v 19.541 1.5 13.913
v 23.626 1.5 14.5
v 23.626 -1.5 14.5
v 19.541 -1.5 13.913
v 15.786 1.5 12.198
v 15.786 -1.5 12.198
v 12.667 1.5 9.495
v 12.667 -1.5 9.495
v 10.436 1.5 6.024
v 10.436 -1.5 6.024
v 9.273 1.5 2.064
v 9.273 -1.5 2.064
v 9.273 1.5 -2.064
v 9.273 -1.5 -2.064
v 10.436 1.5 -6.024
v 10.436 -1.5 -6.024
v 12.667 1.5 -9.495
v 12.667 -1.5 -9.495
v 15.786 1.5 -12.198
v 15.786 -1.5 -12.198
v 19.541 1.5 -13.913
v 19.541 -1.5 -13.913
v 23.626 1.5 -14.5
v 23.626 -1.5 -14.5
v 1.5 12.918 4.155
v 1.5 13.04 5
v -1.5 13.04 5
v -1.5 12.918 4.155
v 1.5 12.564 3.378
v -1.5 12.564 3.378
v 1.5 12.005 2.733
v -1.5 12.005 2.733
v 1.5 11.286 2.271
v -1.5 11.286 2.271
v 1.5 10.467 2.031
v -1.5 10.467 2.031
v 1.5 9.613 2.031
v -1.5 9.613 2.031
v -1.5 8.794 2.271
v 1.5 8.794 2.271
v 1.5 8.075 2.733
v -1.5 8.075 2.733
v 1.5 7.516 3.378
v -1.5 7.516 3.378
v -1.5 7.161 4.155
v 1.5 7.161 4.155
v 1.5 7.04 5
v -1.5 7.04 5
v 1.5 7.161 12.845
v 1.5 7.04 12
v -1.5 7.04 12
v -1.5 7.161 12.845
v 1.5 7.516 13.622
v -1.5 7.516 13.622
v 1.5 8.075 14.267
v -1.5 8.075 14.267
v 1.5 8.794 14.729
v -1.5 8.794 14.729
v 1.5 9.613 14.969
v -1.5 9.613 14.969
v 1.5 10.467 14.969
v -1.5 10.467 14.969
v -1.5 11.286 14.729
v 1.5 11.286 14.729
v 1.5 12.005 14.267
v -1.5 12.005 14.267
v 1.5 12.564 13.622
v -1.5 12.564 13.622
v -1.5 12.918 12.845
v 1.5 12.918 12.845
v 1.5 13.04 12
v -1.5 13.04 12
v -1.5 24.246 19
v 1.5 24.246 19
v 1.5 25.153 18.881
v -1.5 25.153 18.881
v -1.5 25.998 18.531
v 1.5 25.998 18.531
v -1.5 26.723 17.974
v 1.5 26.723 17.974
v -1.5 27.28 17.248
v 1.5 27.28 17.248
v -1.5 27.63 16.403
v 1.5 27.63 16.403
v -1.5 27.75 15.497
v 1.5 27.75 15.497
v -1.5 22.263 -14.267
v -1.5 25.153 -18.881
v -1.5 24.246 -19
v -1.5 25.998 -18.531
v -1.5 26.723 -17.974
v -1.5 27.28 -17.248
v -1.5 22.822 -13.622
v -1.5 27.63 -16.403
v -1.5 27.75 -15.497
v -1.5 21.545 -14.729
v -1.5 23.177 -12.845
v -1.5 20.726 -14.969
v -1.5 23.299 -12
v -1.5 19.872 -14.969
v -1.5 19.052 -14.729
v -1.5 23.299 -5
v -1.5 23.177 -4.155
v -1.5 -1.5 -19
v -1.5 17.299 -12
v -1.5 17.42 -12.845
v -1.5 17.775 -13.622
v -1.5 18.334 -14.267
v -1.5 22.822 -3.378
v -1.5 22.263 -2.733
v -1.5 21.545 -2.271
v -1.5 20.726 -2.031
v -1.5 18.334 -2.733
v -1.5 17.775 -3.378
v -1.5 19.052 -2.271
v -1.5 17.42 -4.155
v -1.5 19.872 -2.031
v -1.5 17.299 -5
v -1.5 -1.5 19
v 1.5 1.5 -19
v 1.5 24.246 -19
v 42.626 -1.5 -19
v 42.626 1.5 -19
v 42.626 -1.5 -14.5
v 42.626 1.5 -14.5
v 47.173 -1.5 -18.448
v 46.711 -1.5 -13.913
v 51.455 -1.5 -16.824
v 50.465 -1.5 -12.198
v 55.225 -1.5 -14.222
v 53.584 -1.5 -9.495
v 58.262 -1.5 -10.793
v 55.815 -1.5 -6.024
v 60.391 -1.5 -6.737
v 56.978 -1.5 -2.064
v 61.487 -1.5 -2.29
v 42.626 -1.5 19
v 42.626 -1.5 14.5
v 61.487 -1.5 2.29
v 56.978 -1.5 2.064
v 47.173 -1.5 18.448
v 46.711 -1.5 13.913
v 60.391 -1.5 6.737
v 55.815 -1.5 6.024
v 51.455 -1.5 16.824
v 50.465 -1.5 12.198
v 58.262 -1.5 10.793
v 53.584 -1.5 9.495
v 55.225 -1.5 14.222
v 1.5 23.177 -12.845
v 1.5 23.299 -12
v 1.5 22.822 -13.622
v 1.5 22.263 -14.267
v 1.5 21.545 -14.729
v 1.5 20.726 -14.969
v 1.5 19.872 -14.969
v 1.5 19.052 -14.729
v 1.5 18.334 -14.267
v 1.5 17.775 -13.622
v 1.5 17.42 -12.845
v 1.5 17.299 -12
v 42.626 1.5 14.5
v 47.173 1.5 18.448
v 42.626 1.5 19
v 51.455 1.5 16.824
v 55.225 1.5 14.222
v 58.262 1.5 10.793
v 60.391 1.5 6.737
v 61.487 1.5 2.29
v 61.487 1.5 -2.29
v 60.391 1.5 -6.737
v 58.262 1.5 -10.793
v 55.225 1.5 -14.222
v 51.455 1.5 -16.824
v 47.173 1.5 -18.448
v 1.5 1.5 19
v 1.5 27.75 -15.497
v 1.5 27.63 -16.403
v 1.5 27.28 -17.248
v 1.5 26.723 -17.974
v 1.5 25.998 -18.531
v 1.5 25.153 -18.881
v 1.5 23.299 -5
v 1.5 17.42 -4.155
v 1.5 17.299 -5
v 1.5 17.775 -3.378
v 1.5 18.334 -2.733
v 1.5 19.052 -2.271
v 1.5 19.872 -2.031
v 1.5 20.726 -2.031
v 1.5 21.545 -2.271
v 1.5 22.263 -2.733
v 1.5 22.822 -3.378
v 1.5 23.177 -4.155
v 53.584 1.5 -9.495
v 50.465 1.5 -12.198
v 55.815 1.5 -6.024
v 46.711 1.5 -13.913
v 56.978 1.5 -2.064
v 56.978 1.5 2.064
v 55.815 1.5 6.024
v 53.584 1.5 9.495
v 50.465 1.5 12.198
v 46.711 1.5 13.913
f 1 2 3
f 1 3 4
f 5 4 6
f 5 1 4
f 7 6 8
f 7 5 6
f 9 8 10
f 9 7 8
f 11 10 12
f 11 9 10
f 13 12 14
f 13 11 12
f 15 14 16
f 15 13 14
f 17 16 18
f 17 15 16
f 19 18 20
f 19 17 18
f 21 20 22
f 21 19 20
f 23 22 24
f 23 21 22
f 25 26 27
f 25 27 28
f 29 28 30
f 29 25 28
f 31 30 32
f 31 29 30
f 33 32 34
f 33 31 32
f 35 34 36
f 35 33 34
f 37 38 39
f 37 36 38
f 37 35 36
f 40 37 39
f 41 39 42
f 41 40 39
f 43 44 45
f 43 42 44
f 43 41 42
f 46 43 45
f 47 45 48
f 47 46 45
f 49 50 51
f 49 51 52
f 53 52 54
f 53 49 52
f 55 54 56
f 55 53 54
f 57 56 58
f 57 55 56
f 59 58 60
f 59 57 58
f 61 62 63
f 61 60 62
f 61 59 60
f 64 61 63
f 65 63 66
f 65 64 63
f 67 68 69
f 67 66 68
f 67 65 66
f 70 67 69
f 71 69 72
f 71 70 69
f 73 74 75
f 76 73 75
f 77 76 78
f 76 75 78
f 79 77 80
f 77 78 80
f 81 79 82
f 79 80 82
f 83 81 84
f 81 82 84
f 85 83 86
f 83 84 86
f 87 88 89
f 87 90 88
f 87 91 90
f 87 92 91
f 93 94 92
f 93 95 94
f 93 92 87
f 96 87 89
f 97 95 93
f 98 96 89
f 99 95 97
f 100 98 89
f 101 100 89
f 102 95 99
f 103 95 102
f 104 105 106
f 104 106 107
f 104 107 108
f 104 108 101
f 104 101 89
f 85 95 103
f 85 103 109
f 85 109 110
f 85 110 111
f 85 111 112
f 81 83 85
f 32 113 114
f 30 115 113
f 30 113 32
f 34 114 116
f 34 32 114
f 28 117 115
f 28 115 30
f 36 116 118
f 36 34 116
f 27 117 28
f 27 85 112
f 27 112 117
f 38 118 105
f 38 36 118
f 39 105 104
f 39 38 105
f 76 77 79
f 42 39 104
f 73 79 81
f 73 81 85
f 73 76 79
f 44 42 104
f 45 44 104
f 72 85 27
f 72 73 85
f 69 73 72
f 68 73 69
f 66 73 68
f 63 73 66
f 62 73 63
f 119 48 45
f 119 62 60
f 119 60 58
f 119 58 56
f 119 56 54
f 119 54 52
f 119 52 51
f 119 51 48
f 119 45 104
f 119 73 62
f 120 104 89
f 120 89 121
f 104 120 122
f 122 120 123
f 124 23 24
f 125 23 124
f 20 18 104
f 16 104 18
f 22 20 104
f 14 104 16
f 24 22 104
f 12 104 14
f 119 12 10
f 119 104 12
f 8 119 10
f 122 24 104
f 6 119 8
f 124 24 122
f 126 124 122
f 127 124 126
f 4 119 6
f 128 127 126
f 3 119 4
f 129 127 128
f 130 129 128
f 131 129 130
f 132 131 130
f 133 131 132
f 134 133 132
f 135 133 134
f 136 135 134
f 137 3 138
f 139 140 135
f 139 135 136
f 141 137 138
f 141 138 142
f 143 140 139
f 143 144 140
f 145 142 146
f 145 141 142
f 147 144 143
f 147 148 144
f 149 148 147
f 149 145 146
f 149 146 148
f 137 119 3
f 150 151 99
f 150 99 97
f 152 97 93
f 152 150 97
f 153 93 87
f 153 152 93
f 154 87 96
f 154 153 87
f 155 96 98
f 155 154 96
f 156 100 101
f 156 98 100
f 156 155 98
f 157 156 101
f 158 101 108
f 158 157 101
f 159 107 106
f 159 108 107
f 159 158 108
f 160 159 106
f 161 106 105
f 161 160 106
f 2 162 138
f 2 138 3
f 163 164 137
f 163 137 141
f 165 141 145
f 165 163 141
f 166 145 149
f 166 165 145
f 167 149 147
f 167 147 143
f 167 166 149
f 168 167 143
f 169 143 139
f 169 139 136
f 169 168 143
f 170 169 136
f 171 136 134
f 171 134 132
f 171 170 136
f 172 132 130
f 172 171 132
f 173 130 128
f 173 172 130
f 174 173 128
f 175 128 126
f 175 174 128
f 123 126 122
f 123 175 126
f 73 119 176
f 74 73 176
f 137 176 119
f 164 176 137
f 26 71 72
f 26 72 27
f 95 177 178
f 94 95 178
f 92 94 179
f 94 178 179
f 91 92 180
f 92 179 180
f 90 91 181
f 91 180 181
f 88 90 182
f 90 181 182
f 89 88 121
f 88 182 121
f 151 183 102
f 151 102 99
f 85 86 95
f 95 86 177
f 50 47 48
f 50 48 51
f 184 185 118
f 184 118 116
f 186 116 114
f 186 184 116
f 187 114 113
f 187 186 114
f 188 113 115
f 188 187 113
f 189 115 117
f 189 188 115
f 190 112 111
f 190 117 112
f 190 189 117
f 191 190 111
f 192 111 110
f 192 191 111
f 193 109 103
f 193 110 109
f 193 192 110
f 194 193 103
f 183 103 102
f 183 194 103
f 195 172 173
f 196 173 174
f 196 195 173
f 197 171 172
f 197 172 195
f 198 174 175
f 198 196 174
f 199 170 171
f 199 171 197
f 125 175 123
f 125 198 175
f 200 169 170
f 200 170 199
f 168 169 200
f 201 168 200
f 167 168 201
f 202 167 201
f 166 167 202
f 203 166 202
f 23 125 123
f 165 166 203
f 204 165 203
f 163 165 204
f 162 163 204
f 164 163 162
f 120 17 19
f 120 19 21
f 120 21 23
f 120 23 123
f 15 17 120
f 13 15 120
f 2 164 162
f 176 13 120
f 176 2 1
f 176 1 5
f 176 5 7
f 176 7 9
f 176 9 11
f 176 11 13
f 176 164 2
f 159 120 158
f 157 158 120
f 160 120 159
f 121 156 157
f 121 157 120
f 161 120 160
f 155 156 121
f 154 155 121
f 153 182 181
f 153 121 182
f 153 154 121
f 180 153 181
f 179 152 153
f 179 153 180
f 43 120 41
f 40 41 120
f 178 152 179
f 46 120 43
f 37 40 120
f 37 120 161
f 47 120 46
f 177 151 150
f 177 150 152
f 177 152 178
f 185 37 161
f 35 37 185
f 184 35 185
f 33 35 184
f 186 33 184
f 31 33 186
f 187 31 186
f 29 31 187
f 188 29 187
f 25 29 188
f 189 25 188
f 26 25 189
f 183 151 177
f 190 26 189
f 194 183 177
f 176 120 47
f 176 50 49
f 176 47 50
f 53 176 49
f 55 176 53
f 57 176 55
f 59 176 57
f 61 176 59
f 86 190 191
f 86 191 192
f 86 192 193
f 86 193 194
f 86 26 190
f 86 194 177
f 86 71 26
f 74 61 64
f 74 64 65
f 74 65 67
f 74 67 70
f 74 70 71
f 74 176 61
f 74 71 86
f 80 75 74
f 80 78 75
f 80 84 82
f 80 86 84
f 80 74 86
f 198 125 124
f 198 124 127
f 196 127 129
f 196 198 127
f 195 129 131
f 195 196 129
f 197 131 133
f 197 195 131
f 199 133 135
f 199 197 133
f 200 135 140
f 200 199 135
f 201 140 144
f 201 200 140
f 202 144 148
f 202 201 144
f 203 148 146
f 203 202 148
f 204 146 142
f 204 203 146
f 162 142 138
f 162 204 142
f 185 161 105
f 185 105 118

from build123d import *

# Parameters (mm, degrees)
EXTRUDE_THIN1_DEPTH = 19
CUT_EXTRUDE1_DEPTH  = 4
CUT_EXTRUDE2_DEPTH  = 10


with BuildPart() as part:
    # Sketch2 → Extrude-Thin1 (new body, symmetric)
    with BuildSketch(Plane.XY):
        Polygon((-1.5, 32), (-1.5, -1.5), (63, -1.5), (63, 1.5), (1.5, 1.5), (1.5, 32), align=None)
    extrude(amount=EXTRUDE_THIN1_DEPTH, both=True)

    # Sketch3 → Cut-Extrude1 (cut, through all)
    with BuildSketch(Plane(origin=(1.5, 0, 0), x_dir=(0, 0, -1), z_dir=(1, 0, 0))):
        with BuildLine():
            Line((5, 23.298608028), (12, 23.298608028))
            ThreePointArc((12, 23.298608028), (15, 20.298608028), (12, 17.298608028))
            Line((12, 17.298608028), (5, 17.298608028))
            ThreePointArc((5, 17.298608028), (2, 20.298608028), (5, 23.298608028))
        make_face()
        with BuildLine():
            Line((-12, 13.03992903), (-5, 13.03992903))
            ThreePointArc((-5, 13.03992903), (-2, 10.03992903), (-5, 7.03992903))
            Line((-5, 7.03992903), (-12, 7.03992903))
            ThreePointArc((-12, 7.03992903), (-15, 10.03992903), (-12, 13.03992903))
        make_face()
        with BuildLine():
            Line((-15.496537692, 27.749610789), (15.496537692, 27.749610789))
            ThreePointArc((15.496537692, 27.749610789), (17.973859648, 26.723470437), (19, 24.246148481))
            Line((19, 24.246148481), (19, 32))
            Line((19, 32), (-19, 32))
            Line((-19, 32), (-19, 24.246148481))
            ThreePointArc((-19, 24.246148481), (-17.973859648, 26.723470437), (-15.496537692, 27.749610789))
        make_face()
    extrude(amount=-CUT_EXTRUDE1_DEPTH, mode=Mode.SUBTRACT)

    # Sketch4 → Cut-Extrude2 (cut)
    with BuildSketch(Plane(origin=(0, 1.5, 0), x_dir=(1, 0, 0), z_dir=(0, 1, 0))):
        with BuildLine():
            Line((42.625671961, -14.5), (23.625671961, -14.5))
            ThreePointArc((23.625671961, -14.5), (9.125671961, 0), (23.625671961, 14.5))
            Line((23.625671961, 14.5), (42.625671961, 14.5))
            ThreePointArc((42.625671961, 14.5), (57.125671961, 0), (42.625671961, -14.5))
        make_face()
        with BuildLine():
            Line((42.625671961, 19), (63, 19))
            Line((63, 19), (63, -19))
            Line((63, -19), (42.625671961, -19))
            ThreePointArc((42.625671961, -19), (61.625671961, 0), (42.625671961, 19))
        make_face()
    extrude(amount=-CUT_EXTRUDE2_DEPTH, mode=Mode.SUBTRACT)


solid = part.part
